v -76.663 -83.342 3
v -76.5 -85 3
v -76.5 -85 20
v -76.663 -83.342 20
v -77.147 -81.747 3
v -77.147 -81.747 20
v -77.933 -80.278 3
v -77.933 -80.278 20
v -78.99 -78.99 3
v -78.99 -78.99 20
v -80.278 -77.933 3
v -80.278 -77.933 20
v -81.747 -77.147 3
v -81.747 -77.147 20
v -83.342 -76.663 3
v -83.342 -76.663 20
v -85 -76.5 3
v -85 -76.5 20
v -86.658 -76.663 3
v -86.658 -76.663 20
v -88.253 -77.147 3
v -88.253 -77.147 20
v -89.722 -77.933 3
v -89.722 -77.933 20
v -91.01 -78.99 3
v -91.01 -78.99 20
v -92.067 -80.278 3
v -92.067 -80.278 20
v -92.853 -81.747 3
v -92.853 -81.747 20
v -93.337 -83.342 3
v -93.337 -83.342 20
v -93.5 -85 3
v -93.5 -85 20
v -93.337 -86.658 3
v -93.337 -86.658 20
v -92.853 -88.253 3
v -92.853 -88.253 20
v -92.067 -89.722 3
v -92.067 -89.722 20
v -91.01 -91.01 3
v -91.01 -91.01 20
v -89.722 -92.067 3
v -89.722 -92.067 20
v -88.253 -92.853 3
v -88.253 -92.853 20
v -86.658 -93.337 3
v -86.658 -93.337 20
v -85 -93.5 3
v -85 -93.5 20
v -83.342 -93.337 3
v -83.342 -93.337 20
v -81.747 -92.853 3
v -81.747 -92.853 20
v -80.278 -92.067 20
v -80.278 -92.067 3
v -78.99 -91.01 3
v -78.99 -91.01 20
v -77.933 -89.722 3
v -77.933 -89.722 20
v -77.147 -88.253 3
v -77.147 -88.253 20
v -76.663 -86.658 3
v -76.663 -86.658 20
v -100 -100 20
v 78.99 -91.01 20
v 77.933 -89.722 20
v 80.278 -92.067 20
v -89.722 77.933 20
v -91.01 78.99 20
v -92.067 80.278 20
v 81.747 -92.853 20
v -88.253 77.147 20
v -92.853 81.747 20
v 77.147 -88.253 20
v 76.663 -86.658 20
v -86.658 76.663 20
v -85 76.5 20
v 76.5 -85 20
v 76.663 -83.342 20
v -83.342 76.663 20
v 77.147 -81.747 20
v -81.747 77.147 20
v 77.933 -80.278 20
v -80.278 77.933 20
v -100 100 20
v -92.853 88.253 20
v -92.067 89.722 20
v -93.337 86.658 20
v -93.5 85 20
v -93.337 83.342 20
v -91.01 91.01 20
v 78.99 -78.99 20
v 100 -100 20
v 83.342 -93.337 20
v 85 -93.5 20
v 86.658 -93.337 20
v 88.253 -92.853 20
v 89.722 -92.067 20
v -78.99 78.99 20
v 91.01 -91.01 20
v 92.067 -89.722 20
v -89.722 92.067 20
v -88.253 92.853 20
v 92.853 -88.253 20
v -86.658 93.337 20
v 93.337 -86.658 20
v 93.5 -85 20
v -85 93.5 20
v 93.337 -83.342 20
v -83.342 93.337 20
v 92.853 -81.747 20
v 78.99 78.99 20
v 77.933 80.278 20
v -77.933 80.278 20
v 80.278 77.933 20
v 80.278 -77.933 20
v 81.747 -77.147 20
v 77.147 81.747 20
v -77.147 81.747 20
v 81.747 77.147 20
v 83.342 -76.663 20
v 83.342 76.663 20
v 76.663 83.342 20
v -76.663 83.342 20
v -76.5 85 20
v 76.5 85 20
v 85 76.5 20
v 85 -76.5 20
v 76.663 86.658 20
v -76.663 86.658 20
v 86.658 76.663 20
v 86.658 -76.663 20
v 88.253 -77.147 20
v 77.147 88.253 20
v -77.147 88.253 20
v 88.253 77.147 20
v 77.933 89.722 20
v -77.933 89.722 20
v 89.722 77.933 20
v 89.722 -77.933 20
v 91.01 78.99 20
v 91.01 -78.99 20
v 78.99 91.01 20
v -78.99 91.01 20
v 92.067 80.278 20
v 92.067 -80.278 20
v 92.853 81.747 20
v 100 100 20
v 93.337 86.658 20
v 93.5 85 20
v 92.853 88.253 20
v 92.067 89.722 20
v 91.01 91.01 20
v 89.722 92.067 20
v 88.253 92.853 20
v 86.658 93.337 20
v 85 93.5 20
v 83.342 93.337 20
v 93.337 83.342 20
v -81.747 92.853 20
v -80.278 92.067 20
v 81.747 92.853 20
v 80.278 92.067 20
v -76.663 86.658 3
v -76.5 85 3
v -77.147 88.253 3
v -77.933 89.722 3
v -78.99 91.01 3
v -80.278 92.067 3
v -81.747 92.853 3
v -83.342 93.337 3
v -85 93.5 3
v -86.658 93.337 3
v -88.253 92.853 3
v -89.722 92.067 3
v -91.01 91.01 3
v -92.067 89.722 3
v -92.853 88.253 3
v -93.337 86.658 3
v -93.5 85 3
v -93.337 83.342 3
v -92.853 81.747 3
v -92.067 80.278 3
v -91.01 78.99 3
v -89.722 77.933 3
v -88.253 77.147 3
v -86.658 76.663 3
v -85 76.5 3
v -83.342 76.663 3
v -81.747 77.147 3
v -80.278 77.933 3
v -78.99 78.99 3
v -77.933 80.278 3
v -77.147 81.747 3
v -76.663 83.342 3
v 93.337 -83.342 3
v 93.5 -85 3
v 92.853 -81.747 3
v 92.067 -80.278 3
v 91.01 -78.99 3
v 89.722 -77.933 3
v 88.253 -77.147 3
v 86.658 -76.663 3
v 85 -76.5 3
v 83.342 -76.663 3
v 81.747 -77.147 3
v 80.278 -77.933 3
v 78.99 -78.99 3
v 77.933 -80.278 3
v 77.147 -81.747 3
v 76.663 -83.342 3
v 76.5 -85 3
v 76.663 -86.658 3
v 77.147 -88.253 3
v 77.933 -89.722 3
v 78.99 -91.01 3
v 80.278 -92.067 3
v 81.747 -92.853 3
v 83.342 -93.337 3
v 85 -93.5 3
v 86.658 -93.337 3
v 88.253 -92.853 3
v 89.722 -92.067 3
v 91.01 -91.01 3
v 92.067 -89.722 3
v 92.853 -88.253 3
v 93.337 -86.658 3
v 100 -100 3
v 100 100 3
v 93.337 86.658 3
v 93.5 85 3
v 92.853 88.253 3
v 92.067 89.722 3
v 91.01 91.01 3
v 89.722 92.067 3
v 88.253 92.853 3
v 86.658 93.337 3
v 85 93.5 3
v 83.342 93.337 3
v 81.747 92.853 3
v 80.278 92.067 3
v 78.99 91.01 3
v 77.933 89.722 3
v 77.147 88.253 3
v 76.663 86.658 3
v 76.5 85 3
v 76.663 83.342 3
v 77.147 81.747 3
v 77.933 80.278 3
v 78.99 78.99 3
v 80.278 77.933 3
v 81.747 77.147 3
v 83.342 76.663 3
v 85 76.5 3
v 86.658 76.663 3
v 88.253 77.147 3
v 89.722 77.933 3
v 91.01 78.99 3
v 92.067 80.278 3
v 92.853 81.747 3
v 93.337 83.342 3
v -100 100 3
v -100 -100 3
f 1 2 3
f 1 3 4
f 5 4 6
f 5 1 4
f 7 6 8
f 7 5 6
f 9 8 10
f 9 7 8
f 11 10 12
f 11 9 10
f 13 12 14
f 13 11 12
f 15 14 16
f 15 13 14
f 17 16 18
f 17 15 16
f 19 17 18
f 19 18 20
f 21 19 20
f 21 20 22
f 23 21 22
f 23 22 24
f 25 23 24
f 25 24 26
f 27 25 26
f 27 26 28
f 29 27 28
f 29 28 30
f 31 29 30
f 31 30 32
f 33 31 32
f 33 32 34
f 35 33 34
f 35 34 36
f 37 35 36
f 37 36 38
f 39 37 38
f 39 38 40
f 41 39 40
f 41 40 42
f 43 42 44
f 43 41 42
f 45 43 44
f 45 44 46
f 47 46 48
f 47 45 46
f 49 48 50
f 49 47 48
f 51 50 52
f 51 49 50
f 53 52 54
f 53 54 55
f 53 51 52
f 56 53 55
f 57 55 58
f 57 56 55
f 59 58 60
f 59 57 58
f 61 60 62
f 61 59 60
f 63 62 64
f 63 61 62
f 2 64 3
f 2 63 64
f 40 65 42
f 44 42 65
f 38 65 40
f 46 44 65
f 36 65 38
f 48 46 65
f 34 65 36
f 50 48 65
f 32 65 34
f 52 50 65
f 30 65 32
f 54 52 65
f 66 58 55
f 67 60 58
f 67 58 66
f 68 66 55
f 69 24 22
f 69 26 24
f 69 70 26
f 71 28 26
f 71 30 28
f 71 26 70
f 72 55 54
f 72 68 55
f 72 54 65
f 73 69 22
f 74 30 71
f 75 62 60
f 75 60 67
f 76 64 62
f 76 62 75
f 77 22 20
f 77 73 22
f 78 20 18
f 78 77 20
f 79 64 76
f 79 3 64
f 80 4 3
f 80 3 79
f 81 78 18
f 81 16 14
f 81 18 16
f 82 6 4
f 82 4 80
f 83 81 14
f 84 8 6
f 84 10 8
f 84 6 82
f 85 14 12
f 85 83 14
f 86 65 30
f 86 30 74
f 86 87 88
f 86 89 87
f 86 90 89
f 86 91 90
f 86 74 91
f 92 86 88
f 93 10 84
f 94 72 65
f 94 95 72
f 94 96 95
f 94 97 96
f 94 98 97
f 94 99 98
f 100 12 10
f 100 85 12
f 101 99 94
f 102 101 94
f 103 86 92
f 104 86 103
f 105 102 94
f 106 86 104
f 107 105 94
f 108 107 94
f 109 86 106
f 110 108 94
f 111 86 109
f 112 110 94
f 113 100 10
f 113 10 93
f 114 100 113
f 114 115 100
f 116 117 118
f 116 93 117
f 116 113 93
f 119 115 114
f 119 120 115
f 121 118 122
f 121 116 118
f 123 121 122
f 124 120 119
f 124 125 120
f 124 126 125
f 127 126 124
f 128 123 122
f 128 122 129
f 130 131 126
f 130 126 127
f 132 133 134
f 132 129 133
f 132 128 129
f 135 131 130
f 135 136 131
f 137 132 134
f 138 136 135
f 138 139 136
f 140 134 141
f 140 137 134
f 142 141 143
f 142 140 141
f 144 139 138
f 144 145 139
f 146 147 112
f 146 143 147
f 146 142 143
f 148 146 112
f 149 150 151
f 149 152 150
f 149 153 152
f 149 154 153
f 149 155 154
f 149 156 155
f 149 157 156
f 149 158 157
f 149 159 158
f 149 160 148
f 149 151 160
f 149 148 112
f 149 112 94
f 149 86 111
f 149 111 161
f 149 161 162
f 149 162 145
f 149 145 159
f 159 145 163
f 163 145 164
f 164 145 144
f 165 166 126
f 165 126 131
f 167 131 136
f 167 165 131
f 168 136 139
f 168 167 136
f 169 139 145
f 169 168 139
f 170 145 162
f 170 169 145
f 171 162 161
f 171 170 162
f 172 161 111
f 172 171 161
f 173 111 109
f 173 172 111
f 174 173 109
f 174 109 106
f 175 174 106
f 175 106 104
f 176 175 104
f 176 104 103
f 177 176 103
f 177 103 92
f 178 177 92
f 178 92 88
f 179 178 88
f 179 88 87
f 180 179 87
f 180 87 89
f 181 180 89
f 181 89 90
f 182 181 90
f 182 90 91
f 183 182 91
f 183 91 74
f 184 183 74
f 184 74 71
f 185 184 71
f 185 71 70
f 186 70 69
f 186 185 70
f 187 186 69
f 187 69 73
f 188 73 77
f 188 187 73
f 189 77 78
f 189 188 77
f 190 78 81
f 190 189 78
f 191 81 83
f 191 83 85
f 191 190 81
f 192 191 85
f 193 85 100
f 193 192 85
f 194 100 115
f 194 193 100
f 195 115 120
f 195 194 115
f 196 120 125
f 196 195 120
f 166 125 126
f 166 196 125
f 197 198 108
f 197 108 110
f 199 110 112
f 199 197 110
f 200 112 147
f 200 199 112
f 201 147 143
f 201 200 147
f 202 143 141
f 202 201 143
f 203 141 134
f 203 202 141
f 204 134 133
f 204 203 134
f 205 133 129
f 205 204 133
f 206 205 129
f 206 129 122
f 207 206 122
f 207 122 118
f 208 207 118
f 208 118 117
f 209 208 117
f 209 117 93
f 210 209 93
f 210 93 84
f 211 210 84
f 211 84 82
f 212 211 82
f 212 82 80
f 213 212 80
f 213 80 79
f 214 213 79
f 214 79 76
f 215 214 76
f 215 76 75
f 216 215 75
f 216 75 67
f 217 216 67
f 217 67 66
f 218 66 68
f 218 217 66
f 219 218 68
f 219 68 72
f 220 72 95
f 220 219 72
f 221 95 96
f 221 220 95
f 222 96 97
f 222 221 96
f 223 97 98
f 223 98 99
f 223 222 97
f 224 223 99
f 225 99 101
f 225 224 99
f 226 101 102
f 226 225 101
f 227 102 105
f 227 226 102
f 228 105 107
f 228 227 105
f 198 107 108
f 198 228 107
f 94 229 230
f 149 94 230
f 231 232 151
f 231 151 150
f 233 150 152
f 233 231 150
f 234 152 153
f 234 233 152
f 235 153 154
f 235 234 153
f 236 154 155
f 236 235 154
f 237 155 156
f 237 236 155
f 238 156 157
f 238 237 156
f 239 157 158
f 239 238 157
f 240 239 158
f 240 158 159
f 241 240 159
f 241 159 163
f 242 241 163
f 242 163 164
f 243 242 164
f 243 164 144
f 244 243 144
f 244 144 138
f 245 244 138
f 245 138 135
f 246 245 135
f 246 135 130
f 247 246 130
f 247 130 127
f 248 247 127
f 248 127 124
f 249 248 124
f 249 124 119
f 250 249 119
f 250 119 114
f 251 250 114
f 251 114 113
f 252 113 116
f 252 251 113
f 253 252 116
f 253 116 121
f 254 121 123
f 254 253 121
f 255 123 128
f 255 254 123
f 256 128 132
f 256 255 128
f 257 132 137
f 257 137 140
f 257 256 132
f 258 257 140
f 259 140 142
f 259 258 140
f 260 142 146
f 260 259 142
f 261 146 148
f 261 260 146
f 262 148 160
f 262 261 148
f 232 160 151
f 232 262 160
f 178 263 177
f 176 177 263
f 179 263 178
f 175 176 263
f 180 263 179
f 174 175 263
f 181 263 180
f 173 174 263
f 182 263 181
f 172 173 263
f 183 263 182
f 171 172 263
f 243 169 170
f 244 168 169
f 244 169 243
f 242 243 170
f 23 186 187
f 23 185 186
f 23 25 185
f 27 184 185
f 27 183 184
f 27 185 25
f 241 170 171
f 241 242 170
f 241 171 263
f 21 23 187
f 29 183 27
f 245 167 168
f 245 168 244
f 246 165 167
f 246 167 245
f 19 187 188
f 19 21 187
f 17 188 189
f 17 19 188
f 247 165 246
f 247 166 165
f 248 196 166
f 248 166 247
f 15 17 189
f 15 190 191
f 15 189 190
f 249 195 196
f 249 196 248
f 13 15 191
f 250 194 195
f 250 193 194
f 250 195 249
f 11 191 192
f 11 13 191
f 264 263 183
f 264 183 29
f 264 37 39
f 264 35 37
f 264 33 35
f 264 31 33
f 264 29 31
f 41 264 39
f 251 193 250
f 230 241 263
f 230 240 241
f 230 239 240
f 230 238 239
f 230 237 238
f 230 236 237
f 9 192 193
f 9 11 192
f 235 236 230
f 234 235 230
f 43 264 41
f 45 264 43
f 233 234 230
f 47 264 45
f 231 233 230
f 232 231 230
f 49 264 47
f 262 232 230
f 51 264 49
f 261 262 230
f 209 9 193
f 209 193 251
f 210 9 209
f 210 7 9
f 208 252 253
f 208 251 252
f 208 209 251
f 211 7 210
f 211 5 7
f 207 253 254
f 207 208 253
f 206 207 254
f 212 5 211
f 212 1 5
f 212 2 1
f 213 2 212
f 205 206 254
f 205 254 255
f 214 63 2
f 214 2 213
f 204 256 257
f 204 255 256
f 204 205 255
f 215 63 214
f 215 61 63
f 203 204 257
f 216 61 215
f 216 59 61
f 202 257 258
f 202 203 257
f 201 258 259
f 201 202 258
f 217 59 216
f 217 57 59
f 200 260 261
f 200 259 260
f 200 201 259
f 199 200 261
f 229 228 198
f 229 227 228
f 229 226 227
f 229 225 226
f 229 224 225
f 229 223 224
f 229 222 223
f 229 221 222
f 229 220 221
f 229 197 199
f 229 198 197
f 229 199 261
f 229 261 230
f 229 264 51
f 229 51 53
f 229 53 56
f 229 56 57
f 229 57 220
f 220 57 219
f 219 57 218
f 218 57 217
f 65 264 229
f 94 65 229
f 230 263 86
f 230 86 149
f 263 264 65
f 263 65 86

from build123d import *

# Parameters (mm, degrees)
F0_W     = 200
F0_H     = 200
F0_R     = 8.5
F1_DEPTH = 20
F2_W     = 265.768706
F2_H     = 235.001818
F3_DEPTH = 3


with BuildPart() as f1:
    # F0 (on Top) → F1 (new body)
    with BuildSketch(Plane.XY):
        Rectangle(F0_W, F0_H)
        with Locations((-85, -85)):
            Circle(F0_R, mode=Mode.SUBTRACT)
        with Locations((85, -85)):
            Circle(F0_R, mode=Mode.SUBTRACT)
        with Locations((-85, 85)):
            Circle(F0_R, mode=Mode.SUBTRACT)
        with Locations((85, 85)):
            Circle(F0_R, mode=Mode.SUBTRACT)
    extrude(amount=F1_DEPTH)

    # F2 (on face) → F3 (cut)
    with BuildSketch(Plane(origin=(0, 0, 0), x_dir=(1, 0, 0), z_dir=(0, 0, -1))):
        Rectangle(F2_W, F2_H)
    extrude(amount=-F3_DEPTH, mode=Mode.SUBTRACT)


solid = f1.part
